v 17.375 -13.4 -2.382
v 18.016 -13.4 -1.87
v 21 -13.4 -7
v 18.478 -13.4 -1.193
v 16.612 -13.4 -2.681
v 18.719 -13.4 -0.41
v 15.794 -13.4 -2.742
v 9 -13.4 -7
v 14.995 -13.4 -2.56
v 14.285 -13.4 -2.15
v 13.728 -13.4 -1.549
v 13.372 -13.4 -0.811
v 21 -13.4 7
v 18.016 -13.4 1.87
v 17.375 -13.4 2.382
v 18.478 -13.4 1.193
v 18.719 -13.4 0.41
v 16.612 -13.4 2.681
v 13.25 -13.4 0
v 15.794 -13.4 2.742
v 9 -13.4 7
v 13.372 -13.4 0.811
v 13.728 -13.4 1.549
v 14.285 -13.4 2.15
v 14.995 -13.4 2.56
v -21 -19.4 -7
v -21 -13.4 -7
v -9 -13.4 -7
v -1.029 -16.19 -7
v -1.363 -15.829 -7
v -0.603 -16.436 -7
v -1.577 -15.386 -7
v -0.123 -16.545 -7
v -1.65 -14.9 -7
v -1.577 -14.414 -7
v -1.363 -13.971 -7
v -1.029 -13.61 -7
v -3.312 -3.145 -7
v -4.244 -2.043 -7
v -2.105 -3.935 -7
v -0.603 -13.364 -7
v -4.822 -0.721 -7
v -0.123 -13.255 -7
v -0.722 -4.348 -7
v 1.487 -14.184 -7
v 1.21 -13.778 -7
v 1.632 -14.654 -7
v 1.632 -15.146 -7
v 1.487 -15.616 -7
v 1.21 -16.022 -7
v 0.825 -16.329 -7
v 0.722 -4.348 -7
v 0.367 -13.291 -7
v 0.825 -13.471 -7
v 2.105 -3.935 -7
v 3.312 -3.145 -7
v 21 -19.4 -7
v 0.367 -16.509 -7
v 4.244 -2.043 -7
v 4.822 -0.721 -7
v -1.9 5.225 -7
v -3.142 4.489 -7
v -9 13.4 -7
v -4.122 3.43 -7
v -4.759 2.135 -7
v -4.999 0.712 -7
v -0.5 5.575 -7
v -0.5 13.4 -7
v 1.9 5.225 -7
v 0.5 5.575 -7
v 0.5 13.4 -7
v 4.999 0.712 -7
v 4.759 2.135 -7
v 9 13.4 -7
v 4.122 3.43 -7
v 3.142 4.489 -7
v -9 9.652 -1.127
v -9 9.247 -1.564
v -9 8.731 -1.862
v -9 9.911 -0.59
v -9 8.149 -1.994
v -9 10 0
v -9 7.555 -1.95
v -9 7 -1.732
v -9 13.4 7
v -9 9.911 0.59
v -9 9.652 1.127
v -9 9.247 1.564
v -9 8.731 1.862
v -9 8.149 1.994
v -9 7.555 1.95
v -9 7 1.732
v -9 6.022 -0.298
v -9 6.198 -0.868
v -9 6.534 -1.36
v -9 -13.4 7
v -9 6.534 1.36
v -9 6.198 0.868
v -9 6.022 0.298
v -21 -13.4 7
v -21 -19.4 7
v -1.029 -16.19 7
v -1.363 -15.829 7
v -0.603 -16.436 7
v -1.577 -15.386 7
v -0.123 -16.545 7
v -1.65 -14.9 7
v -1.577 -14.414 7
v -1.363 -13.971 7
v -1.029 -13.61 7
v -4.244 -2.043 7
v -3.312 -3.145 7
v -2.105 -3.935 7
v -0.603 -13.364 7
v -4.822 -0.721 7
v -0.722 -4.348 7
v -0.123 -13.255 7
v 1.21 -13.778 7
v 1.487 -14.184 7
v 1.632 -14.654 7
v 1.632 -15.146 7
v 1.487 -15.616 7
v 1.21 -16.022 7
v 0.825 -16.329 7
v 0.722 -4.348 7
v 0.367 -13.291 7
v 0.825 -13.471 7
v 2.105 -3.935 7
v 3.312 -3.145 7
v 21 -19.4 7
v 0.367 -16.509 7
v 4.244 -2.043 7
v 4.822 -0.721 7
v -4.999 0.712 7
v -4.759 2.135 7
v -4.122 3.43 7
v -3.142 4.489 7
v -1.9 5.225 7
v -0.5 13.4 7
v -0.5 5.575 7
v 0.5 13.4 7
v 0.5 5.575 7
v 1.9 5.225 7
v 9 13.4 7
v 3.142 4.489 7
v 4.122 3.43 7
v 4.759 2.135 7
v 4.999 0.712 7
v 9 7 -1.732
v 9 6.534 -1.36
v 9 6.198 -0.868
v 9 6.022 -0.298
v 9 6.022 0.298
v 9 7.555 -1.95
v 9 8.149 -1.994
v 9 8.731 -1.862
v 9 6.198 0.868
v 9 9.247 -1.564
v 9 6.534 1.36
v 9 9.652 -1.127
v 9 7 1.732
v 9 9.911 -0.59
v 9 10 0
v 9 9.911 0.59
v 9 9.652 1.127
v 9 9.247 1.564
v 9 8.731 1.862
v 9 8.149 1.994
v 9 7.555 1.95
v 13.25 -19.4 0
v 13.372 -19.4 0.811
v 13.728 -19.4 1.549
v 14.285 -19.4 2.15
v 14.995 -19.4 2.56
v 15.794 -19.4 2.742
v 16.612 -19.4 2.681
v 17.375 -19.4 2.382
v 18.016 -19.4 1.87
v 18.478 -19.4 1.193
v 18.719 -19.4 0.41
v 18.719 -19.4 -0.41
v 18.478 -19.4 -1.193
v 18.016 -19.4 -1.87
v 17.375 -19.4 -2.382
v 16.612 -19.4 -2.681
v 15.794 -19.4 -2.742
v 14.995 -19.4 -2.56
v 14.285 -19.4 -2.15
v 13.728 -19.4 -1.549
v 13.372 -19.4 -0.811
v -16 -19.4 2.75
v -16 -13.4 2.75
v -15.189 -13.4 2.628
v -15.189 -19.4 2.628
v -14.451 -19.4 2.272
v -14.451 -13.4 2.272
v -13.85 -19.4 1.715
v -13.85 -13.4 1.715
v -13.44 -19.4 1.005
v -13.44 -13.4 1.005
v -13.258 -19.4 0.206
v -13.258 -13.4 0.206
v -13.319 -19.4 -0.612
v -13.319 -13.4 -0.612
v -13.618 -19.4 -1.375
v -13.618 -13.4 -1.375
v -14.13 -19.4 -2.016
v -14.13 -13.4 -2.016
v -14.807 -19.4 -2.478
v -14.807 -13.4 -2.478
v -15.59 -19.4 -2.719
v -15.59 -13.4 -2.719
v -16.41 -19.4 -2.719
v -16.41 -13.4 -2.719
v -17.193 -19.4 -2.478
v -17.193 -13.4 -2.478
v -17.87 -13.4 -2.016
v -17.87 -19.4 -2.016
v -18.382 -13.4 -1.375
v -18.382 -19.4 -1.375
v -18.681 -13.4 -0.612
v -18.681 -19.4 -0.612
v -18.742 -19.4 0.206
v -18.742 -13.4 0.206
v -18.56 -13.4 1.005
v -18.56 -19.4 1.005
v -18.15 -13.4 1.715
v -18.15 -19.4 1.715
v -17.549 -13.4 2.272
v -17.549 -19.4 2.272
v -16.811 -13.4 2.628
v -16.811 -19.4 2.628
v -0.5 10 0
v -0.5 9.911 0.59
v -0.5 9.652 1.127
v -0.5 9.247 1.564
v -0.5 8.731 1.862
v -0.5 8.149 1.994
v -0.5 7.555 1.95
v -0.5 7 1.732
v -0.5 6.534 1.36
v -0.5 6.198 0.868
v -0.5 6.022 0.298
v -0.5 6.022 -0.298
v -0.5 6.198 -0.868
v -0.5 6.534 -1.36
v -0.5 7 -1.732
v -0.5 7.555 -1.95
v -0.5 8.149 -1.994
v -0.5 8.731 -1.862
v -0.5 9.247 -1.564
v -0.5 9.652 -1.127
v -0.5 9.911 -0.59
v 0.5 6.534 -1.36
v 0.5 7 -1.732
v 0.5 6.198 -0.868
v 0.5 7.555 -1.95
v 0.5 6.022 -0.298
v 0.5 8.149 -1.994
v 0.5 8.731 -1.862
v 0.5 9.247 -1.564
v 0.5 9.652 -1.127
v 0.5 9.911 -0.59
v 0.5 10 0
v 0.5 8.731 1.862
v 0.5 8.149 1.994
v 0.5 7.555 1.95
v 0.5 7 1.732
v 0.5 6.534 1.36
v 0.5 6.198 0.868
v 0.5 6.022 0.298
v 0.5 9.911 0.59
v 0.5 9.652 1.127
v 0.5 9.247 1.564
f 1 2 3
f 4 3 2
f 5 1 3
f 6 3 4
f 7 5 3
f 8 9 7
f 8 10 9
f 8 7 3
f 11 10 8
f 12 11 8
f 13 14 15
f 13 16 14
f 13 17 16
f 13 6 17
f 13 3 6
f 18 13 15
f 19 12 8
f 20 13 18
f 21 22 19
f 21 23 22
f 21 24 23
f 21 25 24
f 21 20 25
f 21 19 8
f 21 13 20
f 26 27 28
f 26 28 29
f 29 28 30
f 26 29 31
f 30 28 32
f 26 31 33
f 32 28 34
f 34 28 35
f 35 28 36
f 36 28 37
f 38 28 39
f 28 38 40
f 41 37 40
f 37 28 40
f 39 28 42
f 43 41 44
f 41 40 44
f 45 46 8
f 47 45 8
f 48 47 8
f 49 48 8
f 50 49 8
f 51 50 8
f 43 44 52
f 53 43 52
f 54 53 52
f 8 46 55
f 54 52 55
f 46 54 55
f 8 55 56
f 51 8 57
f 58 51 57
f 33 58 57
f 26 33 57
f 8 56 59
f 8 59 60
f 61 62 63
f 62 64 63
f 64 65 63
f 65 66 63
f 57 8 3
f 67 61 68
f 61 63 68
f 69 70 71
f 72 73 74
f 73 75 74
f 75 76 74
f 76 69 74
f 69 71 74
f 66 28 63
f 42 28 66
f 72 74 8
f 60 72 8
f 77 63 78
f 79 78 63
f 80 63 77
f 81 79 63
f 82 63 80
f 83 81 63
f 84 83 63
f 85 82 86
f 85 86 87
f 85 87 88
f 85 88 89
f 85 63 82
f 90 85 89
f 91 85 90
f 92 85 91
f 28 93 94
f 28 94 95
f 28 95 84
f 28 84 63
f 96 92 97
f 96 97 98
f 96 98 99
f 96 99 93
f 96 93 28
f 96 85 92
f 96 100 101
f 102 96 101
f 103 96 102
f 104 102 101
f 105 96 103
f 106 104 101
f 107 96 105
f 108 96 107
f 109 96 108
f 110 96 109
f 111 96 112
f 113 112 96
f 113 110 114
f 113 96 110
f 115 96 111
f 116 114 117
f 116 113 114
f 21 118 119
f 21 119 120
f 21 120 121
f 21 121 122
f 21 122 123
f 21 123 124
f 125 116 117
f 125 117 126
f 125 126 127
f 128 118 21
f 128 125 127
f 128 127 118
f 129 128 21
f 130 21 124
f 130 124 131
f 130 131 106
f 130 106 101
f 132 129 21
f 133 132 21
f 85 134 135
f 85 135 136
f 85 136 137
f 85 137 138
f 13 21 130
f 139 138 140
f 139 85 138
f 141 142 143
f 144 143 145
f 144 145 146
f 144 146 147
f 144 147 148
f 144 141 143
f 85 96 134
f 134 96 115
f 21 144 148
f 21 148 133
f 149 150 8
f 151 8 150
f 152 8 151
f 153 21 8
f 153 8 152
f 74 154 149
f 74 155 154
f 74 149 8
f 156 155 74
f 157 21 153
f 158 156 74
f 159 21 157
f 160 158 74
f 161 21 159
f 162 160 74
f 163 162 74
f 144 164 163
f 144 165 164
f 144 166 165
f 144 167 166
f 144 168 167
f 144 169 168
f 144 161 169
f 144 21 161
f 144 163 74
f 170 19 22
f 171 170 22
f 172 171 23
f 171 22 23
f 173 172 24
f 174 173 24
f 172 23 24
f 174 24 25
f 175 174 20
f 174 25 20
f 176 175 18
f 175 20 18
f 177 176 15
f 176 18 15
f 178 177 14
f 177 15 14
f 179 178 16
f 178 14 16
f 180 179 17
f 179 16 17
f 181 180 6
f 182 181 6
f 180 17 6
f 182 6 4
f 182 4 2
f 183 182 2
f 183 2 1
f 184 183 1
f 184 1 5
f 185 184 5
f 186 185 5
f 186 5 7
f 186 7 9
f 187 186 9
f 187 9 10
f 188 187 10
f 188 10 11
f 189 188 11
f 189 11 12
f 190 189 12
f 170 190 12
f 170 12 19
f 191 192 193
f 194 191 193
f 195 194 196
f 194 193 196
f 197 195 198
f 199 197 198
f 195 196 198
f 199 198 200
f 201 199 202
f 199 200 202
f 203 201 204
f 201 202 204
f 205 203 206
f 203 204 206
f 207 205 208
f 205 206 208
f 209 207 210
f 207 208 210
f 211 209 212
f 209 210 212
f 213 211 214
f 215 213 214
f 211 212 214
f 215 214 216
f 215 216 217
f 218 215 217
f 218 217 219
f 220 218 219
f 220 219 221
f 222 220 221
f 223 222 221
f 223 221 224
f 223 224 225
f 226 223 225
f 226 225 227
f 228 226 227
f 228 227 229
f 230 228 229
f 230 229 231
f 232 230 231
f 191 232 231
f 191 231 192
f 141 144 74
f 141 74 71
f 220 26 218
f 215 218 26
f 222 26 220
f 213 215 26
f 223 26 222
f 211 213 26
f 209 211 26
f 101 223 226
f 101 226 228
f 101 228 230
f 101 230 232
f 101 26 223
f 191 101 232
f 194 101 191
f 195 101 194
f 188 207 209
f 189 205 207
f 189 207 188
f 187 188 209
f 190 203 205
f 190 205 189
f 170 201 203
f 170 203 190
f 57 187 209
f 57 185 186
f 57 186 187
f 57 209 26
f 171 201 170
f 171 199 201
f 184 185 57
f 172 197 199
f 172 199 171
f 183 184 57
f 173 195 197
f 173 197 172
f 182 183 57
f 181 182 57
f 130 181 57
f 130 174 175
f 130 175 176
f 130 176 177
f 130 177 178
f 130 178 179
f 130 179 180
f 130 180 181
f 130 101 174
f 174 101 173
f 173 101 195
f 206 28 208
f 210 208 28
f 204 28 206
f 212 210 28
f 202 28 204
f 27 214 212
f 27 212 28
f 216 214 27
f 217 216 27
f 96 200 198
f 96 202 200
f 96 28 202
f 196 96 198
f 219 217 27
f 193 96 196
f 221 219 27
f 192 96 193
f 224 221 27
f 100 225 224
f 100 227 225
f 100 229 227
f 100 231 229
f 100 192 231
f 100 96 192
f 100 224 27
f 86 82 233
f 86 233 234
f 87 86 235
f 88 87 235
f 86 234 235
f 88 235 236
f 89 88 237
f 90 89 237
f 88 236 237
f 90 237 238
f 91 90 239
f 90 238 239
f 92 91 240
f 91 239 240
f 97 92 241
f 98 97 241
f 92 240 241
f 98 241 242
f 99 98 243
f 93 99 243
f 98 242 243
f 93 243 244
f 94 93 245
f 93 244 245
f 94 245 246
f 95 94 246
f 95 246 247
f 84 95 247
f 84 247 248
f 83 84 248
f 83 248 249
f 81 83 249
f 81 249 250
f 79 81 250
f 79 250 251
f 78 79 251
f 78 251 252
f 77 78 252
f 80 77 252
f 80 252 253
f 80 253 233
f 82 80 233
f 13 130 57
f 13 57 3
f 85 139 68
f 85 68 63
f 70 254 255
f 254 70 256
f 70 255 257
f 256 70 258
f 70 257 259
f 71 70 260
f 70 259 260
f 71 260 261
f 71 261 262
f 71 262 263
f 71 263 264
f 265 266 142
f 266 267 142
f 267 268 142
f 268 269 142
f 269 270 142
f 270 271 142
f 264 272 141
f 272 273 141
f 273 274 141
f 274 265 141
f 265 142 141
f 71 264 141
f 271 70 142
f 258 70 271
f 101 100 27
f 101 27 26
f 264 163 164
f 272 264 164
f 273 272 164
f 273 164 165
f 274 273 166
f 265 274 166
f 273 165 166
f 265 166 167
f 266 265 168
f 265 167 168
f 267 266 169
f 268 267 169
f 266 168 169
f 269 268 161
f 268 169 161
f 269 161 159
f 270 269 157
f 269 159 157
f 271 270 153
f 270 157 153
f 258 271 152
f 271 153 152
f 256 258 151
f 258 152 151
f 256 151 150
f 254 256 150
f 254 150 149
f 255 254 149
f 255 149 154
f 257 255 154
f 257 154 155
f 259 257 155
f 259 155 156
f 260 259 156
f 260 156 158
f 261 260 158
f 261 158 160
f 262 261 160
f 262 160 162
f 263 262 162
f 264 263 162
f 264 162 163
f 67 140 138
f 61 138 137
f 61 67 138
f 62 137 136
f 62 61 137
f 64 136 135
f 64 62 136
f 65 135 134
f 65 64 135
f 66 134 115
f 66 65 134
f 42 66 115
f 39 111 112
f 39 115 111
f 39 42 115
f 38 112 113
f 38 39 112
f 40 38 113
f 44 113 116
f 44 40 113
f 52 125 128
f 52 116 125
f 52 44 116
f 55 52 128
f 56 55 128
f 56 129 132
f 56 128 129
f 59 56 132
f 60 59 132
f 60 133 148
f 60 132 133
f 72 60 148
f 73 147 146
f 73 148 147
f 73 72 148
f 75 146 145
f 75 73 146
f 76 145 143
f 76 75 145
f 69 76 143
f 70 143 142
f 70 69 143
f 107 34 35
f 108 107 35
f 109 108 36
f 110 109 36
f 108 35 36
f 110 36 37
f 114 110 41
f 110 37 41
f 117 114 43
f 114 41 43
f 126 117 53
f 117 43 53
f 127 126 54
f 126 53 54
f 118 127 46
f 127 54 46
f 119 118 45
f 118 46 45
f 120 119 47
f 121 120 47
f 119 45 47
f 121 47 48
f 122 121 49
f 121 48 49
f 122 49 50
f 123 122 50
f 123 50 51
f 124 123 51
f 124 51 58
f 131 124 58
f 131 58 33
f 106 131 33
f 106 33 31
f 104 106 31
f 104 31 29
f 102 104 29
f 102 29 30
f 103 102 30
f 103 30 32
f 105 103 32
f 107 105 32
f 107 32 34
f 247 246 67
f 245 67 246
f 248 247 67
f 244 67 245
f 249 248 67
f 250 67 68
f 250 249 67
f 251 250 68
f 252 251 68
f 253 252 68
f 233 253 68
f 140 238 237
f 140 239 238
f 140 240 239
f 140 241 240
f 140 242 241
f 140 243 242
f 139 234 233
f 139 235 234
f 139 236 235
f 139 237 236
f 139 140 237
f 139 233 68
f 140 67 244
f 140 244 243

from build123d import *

# Parameters (mm, degrees)
SKETCH_3_R          = 5
EXTRUDE_3_DEPTH     = 7
SKETCH_5_R          = 2.75
CUT_EXTRUDE_1_DEPTH = 10
SKETCH_6_W          = 1
SKETCH_6_H          = 13.139857665
CUT_EXTRUDE_2_DEPTH = 14
SKETCH_7_R          = 2
CUT_EXTRUDE_3_DEPTH = 37.405494091
HOLE_WIZARD_M4_1_D  = 3.3


with BuildPart() as part:
    # 草图3 → 凸台-拉伸3 (new, symmetric)
    with BuildSketch(Plane.XY):
        Polygon((-9, -13.4), (-21, -13.4), (-21, -19.4), (21, -19.4), (21, -13.4), (9, -13.4), (9, 13.4), (-9, 13.4), align=None)
        with Locations((0, 0.6)):
            Circle(SKETCH_3_R, mode=Mode.SUBTRACT)
    extrude(amount=EXTRUDE_3_DEPTH, both=True)

    # 草图5 → 切除-拉伸1 (cut)
    with BuildSketch(Plane(origin=(0, -13.4, 0), x_dir=(1, 0, 0), z_dir=(0, 1, 0))):
        with Locations(Location((-16, 0, 0), (0, 0, 270))):
            Circle(SKETCH_5_R)
        with Locations(Location((16, 0, 0), (0, 0, 180))):
            Circle(SKETCH_5_R)
    extrude(amount=-CUT_EXTRUDE_1_DEPTH, mode=Mode.SUBTRACT)

    # 草图6 → 切除-拉伸2 (cut)
    with BuildSketch(Plane.XY.offset(7)):
        with Locations((0, 10.029998353)):
            Rectangle(SKETCH_6_W, SKETCH_6_H)
    extrude(amount=-CUT_EXTRUDE_2_DEPTH, mode=Mode.SUBTRACT)

    # 草图7 → 切除-拉伸3 (cut, through all)
    with BuildSketch(Plane(origin=(9, 0, 0), x_dir=(0, 0, -1), z_dir=(1, 0, 0))):
        with Locations(Location((0, 8, 0), (0, 0, 90))):
            Circle(SKETCH_7_R)
    extrude(amount=-CUT_EXTRUDE_3_DEPTH, mode=Mode.SUBTRACT)

    # M4 螺纹孔1 (through all)
    with Locations(Plane.XY.offset(7)):
        with Locations((0, -14.9)):
            Hole(HOLE_WIZARD_M4_1_D / 2)


solid = part.part
